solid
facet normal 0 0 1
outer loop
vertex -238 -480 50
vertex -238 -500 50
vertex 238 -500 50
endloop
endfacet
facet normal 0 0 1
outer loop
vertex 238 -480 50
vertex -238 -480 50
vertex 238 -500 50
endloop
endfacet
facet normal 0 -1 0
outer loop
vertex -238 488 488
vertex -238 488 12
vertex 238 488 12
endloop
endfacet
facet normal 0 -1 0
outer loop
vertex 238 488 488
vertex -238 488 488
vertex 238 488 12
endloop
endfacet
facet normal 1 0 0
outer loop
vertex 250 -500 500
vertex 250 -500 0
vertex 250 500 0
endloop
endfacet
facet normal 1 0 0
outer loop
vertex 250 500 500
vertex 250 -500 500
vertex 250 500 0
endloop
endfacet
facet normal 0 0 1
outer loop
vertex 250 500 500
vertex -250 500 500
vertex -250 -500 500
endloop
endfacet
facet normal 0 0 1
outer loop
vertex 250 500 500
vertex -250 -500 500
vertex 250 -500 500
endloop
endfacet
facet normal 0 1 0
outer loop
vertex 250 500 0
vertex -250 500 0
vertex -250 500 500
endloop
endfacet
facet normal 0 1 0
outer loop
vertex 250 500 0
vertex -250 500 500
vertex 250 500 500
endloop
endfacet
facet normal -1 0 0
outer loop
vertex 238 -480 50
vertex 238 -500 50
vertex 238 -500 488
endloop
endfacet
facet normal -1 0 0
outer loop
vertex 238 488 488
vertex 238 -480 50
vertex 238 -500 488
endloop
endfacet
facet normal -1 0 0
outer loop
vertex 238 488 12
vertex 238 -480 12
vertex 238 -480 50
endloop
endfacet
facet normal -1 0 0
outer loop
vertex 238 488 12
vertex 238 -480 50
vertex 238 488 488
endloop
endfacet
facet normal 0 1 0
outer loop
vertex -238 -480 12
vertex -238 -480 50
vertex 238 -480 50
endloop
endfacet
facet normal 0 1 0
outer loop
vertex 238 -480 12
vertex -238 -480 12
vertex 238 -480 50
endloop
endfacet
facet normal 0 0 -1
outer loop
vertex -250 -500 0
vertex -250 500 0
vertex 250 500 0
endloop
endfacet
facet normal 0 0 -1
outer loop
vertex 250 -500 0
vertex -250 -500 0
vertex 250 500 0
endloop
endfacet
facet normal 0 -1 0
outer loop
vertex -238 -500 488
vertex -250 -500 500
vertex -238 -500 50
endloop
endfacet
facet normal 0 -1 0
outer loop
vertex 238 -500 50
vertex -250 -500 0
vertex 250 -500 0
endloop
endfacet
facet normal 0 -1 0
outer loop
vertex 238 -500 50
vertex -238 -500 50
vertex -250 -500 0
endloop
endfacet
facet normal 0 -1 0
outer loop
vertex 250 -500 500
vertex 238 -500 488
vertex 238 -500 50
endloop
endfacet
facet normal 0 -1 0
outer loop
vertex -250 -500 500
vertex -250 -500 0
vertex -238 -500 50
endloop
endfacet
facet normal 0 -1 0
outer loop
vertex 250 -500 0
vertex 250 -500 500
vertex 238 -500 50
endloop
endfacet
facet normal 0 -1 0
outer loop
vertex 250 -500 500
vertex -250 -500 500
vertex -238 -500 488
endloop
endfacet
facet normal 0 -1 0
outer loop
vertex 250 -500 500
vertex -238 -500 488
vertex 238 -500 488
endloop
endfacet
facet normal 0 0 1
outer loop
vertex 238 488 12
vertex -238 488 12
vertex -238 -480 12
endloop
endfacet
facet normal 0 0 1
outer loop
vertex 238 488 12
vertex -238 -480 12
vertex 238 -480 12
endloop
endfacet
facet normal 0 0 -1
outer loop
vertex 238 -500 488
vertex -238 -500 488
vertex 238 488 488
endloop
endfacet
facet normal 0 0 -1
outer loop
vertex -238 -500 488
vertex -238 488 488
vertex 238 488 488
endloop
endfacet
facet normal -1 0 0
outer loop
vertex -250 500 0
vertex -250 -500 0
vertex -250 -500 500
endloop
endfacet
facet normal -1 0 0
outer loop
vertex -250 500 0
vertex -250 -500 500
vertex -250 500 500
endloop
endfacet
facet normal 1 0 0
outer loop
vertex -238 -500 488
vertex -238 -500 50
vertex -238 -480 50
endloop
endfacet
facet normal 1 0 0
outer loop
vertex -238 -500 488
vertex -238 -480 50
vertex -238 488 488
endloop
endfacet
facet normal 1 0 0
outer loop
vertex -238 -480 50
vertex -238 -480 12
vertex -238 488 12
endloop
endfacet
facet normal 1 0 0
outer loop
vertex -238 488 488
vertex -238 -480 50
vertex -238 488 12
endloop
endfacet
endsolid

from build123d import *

# Parameters (mm, degrees)
F0_W     = 500
F0_H     = 1000
F1_DEPTH = 500
F2_T     = -12
F3_W     = 476
F3_H     = 38
F4_DEPTH = 20


with BuildPart() as f1:
    # F0 (on Top) → F1 (new body)
    with BuildSketch(Plane.XY):
        Rectangle(F0_W, F0_H)
    extrude(amount=F1_DEPTH)

    # F2
    f2_openings = [f1.faces().sort_by_distance(p)[0] for p in [
        (0, -500, 250),
    ]]
    offset(amount=F2_T, openings=f2_openings)

    # F3 (on face) → F4 (join)
    with BuildSketch(Plane.XZ.offset(500)):
        with Locations((0, 31)):
            Rectangle(F3_W, F3_H)
    extrude(amount=-F4_DEPTH)


solid = f1.part
